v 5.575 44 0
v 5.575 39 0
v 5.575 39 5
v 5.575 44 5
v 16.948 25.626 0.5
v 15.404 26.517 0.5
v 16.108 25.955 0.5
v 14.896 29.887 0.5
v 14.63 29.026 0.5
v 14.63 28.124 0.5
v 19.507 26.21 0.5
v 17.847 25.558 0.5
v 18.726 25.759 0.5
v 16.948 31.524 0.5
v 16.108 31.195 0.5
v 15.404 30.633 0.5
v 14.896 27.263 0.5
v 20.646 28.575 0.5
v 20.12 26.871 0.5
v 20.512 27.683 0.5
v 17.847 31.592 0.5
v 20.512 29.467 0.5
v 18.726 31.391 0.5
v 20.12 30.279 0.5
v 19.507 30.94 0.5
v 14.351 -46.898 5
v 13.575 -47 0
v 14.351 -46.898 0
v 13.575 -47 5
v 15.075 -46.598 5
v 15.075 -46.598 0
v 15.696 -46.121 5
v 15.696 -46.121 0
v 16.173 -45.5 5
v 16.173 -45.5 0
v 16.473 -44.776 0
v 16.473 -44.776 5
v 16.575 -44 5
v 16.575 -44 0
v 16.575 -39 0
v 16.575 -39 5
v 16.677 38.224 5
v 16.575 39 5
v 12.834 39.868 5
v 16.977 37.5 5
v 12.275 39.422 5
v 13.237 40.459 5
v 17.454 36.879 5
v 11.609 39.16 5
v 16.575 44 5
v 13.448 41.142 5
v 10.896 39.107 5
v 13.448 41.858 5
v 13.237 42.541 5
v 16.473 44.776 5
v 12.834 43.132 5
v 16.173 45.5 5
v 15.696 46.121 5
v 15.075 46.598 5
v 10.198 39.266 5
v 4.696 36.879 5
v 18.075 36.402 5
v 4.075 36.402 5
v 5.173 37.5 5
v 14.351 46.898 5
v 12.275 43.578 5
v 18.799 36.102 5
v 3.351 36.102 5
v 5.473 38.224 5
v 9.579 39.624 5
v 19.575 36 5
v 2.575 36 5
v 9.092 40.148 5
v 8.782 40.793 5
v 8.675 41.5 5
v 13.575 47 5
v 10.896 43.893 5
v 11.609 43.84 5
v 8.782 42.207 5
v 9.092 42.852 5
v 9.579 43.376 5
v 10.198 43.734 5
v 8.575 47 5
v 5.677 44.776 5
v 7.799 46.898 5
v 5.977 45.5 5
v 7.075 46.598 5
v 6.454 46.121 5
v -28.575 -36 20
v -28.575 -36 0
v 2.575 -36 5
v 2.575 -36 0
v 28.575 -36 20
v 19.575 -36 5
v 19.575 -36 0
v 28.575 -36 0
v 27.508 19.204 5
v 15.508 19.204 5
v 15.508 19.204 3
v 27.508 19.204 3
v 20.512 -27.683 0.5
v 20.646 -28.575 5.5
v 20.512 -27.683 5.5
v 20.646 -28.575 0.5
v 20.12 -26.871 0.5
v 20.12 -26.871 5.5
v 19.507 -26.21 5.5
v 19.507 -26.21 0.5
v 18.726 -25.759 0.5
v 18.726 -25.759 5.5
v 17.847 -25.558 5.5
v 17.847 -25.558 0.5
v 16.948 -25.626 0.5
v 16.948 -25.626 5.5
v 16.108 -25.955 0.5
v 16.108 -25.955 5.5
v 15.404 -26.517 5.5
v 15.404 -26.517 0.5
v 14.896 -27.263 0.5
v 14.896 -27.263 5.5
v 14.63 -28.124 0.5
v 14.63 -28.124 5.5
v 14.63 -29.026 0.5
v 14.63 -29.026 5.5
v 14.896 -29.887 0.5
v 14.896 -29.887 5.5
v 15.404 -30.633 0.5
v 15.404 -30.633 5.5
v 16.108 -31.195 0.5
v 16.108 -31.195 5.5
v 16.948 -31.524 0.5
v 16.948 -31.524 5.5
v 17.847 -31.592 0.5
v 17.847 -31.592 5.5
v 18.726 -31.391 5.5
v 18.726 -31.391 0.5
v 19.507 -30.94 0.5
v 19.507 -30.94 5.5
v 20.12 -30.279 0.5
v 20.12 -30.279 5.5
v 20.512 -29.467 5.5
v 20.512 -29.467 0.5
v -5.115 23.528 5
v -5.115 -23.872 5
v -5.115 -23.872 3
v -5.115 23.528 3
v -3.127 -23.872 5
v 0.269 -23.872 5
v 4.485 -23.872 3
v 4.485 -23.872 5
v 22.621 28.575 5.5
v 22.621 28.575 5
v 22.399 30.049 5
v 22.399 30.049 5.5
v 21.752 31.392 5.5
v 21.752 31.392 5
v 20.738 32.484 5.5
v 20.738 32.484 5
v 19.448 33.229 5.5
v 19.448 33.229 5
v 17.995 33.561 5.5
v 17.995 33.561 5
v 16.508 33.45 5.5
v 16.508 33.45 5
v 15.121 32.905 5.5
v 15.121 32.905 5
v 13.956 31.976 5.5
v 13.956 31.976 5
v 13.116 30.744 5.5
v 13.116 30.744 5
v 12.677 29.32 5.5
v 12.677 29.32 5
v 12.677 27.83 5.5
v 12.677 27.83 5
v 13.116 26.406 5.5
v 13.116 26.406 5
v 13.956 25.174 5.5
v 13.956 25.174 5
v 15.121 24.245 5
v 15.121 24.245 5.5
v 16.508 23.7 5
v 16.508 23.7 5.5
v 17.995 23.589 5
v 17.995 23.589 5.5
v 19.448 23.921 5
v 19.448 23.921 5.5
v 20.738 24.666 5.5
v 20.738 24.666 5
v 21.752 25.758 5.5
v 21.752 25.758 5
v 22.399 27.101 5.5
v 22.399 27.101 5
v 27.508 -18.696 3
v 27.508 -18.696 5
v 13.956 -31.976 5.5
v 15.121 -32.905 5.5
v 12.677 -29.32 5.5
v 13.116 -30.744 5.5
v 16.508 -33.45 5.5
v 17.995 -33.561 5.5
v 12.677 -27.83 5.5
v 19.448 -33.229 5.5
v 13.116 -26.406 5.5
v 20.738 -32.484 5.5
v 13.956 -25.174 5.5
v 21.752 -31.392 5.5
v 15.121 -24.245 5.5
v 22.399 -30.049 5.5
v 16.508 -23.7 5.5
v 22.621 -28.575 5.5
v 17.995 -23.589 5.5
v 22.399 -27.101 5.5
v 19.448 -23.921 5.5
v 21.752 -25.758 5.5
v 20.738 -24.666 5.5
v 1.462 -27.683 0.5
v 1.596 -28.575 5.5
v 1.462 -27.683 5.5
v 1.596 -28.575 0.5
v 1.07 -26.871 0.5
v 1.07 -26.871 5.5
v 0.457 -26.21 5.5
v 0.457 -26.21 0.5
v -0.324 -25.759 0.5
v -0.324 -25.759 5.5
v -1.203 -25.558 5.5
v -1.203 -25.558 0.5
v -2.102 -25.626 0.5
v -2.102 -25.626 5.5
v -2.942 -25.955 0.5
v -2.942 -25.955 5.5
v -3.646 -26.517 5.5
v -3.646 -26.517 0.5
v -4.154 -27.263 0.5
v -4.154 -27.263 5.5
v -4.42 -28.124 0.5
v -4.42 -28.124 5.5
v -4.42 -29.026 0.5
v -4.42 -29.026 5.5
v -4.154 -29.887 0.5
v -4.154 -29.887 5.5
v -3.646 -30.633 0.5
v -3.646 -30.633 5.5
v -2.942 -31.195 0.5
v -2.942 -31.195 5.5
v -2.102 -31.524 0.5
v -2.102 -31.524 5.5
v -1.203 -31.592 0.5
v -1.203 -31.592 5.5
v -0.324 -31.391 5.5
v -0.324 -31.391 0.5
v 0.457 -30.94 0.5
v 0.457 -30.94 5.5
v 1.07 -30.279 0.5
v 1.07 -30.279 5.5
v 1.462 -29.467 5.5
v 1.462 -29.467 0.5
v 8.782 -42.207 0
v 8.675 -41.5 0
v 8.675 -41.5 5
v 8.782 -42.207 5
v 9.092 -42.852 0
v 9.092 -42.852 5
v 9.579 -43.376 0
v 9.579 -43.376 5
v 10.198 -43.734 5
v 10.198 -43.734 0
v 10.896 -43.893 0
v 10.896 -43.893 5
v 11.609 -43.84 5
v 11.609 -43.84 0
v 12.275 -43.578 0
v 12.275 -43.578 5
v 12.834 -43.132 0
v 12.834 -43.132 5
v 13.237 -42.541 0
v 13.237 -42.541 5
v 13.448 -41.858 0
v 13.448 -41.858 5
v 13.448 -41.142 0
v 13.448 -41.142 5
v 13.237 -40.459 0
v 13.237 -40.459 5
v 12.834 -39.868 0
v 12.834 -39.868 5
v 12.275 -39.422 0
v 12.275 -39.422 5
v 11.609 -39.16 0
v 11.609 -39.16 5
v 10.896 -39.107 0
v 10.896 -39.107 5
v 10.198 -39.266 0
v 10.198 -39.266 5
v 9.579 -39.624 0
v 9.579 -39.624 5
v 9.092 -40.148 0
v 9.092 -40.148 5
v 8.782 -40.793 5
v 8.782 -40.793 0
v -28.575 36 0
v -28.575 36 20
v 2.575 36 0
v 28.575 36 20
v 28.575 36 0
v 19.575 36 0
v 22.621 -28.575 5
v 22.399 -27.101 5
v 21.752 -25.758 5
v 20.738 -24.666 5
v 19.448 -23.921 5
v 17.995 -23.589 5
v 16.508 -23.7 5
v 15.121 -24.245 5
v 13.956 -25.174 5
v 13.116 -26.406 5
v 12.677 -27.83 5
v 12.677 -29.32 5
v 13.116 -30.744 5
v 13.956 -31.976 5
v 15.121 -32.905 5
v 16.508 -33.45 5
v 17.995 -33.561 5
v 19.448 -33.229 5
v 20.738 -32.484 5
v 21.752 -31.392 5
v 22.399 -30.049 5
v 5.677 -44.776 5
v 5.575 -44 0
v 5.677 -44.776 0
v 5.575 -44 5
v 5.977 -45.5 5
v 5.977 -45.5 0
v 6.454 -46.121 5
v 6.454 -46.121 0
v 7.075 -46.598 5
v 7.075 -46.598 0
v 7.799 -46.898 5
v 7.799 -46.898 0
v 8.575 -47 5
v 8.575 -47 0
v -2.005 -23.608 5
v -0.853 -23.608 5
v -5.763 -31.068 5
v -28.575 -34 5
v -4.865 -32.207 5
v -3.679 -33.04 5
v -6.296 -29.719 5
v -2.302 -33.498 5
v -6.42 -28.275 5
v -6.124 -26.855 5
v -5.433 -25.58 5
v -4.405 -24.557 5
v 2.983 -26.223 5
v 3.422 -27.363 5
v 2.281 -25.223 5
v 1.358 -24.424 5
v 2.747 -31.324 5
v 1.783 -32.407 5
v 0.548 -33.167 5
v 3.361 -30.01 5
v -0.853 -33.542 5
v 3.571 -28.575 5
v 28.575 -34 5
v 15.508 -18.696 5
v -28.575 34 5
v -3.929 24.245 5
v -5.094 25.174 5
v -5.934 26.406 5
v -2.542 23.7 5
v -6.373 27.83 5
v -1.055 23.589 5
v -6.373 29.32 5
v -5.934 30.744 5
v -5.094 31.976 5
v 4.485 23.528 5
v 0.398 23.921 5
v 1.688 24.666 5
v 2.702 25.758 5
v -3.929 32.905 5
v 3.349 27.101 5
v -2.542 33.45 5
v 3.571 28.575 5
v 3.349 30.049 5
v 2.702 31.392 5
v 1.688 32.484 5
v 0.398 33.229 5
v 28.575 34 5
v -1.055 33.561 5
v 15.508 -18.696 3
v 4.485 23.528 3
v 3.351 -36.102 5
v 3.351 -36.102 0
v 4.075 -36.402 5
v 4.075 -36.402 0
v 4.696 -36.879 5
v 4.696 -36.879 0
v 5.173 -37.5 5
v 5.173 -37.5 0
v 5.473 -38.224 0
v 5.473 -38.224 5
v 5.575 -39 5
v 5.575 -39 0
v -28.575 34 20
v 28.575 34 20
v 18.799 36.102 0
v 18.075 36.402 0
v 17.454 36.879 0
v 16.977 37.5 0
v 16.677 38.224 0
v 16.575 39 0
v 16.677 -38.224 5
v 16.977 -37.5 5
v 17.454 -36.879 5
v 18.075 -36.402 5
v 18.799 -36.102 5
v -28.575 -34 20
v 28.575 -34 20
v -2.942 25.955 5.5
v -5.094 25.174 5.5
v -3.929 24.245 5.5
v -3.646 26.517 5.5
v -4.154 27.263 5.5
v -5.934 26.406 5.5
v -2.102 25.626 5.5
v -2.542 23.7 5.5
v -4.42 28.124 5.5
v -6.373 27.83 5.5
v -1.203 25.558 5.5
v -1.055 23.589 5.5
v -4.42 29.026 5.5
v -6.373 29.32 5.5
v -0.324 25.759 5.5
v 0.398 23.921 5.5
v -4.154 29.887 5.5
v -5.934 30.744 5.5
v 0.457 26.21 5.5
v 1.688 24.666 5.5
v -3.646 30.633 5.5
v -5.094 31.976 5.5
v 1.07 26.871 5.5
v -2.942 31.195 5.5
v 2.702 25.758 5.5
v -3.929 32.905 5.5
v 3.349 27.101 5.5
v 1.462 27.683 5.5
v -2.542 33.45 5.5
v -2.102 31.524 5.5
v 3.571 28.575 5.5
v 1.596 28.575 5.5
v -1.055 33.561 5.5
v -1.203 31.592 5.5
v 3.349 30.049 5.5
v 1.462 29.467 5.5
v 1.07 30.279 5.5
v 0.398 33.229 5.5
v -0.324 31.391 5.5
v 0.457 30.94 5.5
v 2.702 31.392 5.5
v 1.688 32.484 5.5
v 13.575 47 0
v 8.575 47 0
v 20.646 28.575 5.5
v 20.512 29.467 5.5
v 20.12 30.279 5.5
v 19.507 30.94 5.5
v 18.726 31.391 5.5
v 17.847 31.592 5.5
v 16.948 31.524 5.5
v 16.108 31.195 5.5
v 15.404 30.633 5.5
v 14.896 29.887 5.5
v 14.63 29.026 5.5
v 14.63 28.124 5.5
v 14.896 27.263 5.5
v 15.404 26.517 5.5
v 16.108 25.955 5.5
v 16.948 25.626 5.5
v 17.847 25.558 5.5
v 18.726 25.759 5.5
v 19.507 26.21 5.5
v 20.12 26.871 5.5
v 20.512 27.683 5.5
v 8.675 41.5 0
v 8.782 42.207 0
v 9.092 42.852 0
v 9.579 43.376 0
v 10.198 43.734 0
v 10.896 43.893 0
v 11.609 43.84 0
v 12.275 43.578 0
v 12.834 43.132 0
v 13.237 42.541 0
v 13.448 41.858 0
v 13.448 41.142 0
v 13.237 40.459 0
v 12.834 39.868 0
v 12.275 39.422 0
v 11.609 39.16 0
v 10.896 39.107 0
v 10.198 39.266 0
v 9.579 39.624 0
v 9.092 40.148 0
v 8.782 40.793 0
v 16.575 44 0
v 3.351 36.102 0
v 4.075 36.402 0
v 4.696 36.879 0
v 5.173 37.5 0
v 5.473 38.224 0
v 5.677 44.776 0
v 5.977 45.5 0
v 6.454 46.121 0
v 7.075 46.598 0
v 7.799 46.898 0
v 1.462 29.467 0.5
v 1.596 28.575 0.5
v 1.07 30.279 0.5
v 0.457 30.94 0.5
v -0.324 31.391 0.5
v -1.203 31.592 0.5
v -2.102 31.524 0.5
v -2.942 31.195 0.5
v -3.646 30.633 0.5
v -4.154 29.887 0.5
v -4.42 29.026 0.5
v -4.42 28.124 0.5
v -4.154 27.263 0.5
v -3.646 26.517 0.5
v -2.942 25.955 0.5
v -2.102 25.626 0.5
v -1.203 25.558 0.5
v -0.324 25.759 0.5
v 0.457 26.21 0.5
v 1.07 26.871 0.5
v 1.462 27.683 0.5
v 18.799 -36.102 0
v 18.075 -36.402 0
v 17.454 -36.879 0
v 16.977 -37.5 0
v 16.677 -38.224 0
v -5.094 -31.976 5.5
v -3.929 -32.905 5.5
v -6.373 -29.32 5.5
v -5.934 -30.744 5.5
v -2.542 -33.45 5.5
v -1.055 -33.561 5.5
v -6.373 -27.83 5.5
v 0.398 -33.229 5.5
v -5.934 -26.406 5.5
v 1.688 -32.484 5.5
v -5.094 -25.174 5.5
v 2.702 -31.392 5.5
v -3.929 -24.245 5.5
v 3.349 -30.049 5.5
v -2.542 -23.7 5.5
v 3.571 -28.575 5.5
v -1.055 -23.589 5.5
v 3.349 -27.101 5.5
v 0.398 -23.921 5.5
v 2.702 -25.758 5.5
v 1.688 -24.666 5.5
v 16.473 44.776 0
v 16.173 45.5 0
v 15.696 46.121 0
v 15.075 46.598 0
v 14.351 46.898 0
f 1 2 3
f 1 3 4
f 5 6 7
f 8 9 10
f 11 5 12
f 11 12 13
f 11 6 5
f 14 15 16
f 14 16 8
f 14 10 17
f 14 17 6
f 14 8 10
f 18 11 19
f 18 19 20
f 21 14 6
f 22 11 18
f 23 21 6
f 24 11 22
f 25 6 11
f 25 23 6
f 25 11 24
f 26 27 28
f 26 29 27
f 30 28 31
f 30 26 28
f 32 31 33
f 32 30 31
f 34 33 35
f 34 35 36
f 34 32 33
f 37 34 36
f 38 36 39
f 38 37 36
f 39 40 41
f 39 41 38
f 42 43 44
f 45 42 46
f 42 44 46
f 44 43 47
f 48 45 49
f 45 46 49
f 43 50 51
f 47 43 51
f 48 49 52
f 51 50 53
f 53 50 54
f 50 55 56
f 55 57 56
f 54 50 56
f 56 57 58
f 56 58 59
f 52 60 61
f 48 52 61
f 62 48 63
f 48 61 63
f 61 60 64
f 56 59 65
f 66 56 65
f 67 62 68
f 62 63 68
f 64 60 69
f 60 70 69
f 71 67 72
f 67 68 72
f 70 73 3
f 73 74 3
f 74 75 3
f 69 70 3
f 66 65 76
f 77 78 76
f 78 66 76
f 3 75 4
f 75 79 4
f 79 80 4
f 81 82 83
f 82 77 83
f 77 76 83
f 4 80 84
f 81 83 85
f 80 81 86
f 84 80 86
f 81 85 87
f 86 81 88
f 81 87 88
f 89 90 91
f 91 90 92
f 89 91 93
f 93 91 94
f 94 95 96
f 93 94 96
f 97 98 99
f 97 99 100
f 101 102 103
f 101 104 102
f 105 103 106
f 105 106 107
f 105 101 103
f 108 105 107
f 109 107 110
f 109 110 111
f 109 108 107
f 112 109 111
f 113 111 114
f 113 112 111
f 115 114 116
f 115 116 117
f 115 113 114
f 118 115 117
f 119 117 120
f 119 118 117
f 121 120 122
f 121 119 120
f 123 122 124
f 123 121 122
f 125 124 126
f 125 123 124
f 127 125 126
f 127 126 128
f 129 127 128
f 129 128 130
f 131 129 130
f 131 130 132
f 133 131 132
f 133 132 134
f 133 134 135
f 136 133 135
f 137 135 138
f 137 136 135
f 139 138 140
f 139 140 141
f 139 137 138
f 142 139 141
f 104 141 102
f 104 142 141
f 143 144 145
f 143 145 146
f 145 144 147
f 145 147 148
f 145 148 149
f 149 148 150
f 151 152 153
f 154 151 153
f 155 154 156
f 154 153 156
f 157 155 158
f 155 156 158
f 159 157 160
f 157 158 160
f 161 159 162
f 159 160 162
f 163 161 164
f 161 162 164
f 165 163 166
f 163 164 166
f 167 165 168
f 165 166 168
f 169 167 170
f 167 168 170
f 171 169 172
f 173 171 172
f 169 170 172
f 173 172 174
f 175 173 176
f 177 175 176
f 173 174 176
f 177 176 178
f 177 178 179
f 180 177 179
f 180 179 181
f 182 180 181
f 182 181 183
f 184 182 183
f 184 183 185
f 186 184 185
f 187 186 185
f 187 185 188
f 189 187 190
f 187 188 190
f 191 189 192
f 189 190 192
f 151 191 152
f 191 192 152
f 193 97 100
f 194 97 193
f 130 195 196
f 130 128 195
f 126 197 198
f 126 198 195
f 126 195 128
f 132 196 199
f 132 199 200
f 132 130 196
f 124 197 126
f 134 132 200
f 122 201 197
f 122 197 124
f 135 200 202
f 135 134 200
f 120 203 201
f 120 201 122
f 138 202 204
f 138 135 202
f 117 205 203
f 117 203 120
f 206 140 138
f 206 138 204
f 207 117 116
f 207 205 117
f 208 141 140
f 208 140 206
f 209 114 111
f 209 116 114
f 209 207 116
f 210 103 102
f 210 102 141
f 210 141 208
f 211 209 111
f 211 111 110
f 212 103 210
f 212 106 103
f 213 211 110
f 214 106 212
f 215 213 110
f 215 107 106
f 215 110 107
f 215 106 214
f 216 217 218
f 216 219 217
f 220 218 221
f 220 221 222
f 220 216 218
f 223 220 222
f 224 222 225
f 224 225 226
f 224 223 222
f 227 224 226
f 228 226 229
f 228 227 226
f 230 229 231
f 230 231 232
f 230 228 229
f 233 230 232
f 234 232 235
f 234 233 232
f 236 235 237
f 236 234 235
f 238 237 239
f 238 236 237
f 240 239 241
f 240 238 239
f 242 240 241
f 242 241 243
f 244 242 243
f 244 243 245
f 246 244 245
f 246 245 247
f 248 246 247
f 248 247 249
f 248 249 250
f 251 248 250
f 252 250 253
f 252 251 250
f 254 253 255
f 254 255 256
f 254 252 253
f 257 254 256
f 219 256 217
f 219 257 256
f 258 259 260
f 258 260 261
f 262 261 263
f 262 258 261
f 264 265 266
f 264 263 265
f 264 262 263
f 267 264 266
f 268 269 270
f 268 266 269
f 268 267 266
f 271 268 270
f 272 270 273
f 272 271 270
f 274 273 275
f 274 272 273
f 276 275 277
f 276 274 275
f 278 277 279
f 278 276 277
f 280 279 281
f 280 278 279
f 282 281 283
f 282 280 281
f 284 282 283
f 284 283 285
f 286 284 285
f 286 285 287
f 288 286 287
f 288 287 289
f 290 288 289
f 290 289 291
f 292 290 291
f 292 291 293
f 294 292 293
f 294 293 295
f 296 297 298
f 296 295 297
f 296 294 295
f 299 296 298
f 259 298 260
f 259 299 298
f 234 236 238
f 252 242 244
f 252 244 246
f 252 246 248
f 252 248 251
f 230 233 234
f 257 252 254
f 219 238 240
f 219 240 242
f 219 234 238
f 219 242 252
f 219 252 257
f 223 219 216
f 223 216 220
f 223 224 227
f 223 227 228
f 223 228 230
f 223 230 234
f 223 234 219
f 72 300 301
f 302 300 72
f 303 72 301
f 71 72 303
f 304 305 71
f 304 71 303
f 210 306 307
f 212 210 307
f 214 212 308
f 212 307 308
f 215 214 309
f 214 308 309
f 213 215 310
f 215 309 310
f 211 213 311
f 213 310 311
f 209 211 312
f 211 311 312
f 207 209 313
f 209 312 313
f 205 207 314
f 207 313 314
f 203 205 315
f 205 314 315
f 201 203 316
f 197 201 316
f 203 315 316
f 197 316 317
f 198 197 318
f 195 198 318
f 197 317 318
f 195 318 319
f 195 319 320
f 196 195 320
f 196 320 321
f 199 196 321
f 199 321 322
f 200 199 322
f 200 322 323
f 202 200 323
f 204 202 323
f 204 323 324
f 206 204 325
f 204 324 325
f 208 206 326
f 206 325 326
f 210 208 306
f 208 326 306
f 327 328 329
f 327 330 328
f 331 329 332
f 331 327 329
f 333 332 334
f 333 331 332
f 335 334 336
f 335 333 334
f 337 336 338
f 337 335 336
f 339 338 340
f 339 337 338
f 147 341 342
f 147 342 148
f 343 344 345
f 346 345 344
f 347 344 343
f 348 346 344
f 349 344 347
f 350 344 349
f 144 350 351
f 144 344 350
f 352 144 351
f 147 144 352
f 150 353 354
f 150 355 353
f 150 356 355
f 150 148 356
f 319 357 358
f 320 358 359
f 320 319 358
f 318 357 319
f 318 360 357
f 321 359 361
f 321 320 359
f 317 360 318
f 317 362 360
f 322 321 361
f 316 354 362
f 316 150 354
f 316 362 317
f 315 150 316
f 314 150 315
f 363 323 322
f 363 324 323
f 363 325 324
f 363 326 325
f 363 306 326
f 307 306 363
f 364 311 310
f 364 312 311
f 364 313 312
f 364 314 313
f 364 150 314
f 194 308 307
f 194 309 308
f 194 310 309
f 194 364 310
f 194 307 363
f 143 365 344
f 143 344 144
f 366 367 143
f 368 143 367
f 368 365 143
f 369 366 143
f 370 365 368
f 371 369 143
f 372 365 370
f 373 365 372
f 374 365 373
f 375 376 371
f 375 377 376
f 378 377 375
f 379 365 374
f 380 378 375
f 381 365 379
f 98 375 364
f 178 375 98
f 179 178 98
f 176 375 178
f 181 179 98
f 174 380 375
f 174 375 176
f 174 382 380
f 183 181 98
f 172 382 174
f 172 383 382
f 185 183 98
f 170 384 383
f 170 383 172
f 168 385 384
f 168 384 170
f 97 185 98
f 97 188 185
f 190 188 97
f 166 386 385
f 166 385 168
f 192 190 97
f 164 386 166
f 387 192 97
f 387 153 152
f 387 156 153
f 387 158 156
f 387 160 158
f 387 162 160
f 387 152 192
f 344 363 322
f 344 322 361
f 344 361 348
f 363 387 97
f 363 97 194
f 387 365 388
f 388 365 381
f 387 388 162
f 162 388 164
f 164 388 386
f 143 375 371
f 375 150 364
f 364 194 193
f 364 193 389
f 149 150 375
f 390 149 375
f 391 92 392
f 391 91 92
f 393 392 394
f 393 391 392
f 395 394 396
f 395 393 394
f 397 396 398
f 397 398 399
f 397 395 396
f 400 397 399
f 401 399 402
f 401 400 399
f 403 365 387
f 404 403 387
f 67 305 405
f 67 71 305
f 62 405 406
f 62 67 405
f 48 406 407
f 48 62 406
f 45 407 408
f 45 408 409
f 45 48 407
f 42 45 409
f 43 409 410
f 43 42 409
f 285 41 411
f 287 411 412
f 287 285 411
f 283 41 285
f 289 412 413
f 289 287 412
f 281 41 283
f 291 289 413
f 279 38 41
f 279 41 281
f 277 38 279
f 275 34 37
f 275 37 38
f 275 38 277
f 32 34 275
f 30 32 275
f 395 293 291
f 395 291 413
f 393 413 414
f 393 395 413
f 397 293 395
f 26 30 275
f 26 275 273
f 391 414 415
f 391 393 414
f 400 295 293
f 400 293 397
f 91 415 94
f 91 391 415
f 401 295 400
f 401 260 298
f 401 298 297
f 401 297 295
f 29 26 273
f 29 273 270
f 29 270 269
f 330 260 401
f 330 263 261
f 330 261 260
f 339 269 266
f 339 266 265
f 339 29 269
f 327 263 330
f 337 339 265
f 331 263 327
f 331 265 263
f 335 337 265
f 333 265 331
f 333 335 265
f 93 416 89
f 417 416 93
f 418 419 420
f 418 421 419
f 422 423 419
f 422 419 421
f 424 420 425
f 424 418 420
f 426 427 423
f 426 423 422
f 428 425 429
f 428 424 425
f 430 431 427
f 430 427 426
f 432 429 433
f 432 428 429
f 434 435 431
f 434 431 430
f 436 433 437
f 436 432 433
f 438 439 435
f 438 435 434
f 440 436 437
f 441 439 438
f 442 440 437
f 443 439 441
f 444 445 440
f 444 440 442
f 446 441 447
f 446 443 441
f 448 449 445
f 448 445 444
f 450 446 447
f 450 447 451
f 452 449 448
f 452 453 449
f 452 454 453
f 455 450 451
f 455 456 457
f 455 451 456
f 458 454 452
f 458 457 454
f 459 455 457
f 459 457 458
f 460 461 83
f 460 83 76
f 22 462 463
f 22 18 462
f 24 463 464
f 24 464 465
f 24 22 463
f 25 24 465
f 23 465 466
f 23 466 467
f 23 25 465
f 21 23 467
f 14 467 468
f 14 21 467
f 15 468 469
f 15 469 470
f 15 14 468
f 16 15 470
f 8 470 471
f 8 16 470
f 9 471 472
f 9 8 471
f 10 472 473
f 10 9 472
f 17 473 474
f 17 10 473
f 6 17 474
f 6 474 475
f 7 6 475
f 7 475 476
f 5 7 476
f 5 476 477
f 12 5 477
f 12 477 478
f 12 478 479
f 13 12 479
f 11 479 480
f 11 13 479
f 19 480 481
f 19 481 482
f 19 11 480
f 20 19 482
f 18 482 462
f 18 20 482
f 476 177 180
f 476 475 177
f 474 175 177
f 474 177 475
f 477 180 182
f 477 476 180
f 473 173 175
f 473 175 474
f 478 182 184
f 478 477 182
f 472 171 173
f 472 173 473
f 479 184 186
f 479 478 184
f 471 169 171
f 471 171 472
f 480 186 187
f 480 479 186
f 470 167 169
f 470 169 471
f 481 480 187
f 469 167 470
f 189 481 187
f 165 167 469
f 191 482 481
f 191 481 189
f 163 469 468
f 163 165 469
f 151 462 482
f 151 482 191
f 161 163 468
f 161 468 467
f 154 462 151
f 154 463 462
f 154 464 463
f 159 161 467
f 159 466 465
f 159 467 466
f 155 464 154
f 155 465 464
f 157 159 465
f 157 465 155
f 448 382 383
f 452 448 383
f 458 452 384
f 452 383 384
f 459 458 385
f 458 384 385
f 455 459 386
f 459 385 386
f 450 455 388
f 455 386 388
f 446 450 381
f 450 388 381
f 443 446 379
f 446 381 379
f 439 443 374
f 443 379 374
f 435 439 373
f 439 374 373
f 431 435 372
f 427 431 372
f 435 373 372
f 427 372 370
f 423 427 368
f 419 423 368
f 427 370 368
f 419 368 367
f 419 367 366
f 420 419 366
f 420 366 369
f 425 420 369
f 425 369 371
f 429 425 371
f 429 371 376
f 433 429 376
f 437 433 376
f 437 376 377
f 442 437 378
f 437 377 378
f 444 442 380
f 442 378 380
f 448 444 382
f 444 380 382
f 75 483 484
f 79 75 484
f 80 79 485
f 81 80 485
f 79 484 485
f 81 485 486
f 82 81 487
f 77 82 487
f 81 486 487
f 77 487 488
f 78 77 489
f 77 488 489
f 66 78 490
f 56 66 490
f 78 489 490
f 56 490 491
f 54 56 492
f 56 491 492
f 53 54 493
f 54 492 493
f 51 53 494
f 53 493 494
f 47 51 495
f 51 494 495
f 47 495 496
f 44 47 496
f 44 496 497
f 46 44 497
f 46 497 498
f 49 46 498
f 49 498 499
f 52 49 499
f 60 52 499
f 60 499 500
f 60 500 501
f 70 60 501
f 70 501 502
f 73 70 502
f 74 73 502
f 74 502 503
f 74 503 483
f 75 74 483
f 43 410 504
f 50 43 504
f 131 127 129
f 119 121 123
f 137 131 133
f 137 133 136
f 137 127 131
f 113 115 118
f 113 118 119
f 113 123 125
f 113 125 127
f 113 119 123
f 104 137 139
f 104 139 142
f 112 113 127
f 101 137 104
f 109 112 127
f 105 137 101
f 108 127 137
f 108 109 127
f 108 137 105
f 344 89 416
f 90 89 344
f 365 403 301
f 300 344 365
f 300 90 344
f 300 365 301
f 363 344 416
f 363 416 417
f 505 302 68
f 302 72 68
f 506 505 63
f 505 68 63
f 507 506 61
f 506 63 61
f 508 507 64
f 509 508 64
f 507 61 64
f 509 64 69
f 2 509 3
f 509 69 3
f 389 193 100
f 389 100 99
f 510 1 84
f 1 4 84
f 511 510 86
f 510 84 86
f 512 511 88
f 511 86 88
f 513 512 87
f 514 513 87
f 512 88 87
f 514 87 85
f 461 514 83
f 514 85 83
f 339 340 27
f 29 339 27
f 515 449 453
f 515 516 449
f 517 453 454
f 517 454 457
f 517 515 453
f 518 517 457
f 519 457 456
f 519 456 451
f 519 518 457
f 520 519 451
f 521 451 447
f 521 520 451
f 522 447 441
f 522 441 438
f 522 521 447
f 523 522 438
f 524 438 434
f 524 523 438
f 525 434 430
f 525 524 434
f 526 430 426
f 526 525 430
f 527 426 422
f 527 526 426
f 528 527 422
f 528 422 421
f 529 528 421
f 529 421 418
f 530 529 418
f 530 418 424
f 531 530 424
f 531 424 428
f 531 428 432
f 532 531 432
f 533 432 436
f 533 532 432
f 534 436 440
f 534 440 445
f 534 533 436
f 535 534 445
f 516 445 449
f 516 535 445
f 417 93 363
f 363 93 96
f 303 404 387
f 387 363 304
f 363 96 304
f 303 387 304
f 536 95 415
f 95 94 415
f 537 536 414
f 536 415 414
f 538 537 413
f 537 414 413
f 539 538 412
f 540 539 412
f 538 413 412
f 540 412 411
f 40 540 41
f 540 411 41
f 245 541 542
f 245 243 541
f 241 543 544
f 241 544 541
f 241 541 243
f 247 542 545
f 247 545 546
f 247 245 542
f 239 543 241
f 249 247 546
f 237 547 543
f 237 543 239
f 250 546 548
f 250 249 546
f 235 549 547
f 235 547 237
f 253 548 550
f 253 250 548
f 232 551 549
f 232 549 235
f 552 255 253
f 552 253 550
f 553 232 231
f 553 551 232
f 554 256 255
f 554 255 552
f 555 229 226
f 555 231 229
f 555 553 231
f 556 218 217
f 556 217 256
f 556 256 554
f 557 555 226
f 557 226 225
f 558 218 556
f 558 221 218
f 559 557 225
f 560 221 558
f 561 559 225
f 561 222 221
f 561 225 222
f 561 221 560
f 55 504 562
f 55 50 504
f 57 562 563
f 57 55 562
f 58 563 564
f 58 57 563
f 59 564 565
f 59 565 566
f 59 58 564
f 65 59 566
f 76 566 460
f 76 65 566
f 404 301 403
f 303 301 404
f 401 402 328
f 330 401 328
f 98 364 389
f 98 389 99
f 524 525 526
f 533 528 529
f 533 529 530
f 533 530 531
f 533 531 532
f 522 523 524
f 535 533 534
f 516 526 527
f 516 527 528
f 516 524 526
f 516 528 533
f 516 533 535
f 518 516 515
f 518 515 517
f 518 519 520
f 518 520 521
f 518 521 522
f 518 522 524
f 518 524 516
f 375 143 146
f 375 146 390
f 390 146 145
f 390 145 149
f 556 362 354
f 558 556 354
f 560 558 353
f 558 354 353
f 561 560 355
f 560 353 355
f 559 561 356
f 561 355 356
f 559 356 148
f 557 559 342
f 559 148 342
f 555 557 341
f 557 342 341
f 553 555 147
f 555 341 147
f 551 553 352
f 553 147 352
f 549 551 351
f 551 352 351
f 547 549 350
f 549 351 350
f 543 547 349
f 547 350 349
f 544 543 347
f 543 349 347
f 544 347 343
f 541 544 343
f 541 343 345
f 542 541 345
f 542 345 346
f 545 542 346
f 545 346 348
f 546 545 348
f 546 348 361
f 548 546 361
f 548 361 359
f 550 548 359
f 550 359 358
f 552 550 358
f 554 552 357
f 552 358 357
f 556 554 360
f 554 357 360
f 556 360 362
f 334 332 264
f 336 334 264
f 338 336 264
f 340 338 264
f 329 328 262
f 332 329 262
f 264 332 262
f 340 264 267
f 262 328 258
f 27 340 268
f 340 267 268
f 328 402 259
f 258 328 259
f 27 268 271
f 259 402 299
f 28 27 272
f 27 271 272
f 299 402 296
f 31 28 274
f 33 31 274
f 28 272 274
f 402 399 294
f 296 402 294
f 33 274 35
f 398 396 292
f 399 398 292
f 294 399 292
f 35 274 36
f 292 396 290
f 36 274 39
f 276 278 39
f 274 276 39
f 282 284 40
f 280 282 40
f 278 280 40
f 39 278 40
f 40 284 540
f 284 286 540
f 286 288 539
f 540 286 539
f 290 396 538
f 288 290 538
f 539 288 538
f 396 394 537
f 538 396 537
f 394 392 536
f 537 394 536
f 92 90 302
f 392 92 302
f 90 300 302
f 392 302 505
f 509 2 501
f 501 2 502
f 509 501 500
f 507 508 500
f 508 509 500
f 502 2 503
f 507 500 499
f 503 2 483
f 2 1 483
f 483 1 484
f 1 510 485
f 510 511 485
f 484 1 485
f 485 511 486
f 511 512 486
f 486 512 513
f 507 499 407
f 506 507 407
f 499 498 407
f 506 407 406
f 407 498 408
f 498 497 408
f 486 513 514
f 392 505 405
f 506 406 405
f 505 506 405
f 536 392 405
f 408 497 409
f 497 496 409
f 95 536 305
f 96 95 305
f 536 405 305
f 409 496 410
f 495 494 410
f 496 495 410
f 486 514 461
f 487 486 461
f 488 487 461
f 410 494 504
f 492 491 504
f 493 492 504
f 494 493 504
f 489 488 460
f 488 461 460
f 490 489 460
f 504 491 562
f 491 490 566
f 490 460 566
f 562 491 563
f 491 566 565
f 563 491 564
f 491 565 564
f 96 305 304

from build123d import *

# Parameters (mm, degrees)
SKETCH3_W            = 57.15
SKETCH3_H            = 72
BOSS_EXTRUDE1_DEPTH  = 5
SKETCH5_R            = 5
SKETCH5_R_2          = 3.025
BOSS_EXTRUDE2_DEPTH  = 0.5
CUT_EXTRUDE1_START   = -4.5
SKETCH6_R            = 3.025
CUT_EXTRUDE1_DEPTH   = 4.5
SKETCH8_W            = 9.600002072
SKETCH8_H            = 47.399999581
CUT_EXTRUDE2_DEPTH   = 2
SKETCH10_W           = 57.15
SKETCH10_H           = 2
BOSS_EXTRUDE3_DEPTH  = 15
SKETCH11_W           = 5.5
SKETCH11_H           = 11
BOSS_EXTRUDE4_DEPTH  = 5
M4_CLEARANCE_HOLE1_D = 4.8
FILLET2_R            = 3


with BuildPart() as part:
    # Sketch3 → Boss-Extrude1 (new body)
    with BuildSketch(Plane.XY):
        Rectangle(SKETCH3_W, SKETCH3_H)
    extrude(amount=BOSS_EXTRUDE1_DEPTH)

    # Sketch5 → Boss-Extrude2 (add)
    # profile 1 of 4: a face of its own
    with BuildSketch(Plane.XY.offset(5)):
        with Locations((17.621, 28.575)):
            Circle(SKETCH5_R)
        with Locations((17.621, 28.575)):
            Circle(SKETCH5_R_2, mode=Mode.SUBTRACT)
    # profile 2 of 4: a face of its own
    with BuildSketch(Plane.XY.offset(5)):
        with Locations((17.621, -28.575)):
            Circle(SKETCH5_R)
        with Locations((17.621, -28.575)):
            Circle(SKETCH5_R_2, mode=Mode.SUBTRACT)
    # profile 3 of 4: a face of its own
    with BuildSketch(Plane.XY.offset(5)):
        with Locations((-1.429, -28.575)):
            Circle(SKETCH5_R)
        with Locations((-1.429, -28.575)):
            Circle(SKETCH5_R_2, mode=Mode.SUBTRACT)
    # profile 4 of 4: a face of its own
    with BuildSketch(Plane.XY.offset(5)):
        with Locations((-1.429, 28.575)):
            Circle(SKETCH5_R)
        with Locations((-1.429, 28.575)):
            Circle(SKETCH5_R_2, mode=Mode.SUBTRACT)
    extrude(amount=BOSS_EXTRUDE2_DEPTH)

    # Sketch6 → Cut-Extrude1 (cut)
    with BuildSketch(Plane.XY.offset(5).offset(CUT_EXTRUDE1_START)):
        with Locations((-1.429, 28.575)):
            Circle(SKETCH6_R)
        with Locations((17.621, 28.575)):
            Circle(SKETCH6_R)
        with Locations((-1.429, -28.575)):
            Circle(SKETCH6_R)
        with Locations((17.621, -28.575)):
            Circle(SKETCH6_R)
    extrude(amount=CUT_EXTRUDE1_DEPTH, mode=Mode.SUBTRACT)

    # Sketch8 → Cut-Extrude2 (cut)
    with BuildSketch(Plane.XY.offset(5)):
        with Locations((-0.315001587, -0.172003205)):
            Rectangle(SKETCH8_W, SKETCH8_H)
        Polygon((15.508001492, 19.203997676), (27.508001492, 19.203997676), (27.508001492, -18.696002324), (15.508003148, -18.696002324), align=None)
    extrude(amount=-CUT_EXTRUDE2_DEPTH, mode=Mode.SUBTRACT)

    # Sketch10 → Boss-Extrude3 (add)
    with BuildSketch(Plane.XY.offset(5)):
        with Locations((0, 35)):
            Rectangle(SKETCH10_W, SKETCH10_H)
        with Locations((0, -35)):
            Rectangle(SKETCH10_W, SKETCH10_H)
    extrude(amount=BOSS_EXTRUDE3_DEPTH)

    # Sketch11 → Boss-Extrude4 (add)
    with BuildSketch(Plane(origin=(0, 0, 0), x_dir=(-1, 0, 0), z_dir=(0, 0, -1))):
        with Locations((-13.825, 41.5)):
            Rectangle(SKETCH11_W, SKETCH11_H)
        with Locations((-8.325, 41.5)):
            Rectangle(SKETCH11_W, SKETCH11_H)
    boss_extrude4 = extrude(amount=-BOSS_EXTRUDE4_DEPTH)

    # M4 Clearance Hole1 (through all)
    with Locations(Plane.XY.offset(5)):
        with Locations((11.075, 41.5)):
            m4_clearance_hole1 = Hole(M4_CLEARANCE_HOLE1_D / 2)

    # Mirror1: Boss-Extrude4, M4 Clearance Hole1 across plane
    add(boss_extrude4.mirror(Plane.ZX))
    add(m4_clearance_hole1.mirror(Plane.ZX), mode=Mode.SUBTRACT)

    # Fillet2
    fillet2_edges = [part.edges().sort_by_distance(p)[0] for p in [
        (5.575, 36, 2.5),
        (16.575, 36, 2.5),
        (16.575, 47, 2.5),
        (5.575, 47, 2.5),
        (16.575, -36, 2.5),
        (5.575, -36, 2.5),
        (5.575, -47, 2.5),
        (16.575, -47, 2.5),
    ]]
    fillet(fillet2_edges, radius=FILLET2_R)


solid = part.part
